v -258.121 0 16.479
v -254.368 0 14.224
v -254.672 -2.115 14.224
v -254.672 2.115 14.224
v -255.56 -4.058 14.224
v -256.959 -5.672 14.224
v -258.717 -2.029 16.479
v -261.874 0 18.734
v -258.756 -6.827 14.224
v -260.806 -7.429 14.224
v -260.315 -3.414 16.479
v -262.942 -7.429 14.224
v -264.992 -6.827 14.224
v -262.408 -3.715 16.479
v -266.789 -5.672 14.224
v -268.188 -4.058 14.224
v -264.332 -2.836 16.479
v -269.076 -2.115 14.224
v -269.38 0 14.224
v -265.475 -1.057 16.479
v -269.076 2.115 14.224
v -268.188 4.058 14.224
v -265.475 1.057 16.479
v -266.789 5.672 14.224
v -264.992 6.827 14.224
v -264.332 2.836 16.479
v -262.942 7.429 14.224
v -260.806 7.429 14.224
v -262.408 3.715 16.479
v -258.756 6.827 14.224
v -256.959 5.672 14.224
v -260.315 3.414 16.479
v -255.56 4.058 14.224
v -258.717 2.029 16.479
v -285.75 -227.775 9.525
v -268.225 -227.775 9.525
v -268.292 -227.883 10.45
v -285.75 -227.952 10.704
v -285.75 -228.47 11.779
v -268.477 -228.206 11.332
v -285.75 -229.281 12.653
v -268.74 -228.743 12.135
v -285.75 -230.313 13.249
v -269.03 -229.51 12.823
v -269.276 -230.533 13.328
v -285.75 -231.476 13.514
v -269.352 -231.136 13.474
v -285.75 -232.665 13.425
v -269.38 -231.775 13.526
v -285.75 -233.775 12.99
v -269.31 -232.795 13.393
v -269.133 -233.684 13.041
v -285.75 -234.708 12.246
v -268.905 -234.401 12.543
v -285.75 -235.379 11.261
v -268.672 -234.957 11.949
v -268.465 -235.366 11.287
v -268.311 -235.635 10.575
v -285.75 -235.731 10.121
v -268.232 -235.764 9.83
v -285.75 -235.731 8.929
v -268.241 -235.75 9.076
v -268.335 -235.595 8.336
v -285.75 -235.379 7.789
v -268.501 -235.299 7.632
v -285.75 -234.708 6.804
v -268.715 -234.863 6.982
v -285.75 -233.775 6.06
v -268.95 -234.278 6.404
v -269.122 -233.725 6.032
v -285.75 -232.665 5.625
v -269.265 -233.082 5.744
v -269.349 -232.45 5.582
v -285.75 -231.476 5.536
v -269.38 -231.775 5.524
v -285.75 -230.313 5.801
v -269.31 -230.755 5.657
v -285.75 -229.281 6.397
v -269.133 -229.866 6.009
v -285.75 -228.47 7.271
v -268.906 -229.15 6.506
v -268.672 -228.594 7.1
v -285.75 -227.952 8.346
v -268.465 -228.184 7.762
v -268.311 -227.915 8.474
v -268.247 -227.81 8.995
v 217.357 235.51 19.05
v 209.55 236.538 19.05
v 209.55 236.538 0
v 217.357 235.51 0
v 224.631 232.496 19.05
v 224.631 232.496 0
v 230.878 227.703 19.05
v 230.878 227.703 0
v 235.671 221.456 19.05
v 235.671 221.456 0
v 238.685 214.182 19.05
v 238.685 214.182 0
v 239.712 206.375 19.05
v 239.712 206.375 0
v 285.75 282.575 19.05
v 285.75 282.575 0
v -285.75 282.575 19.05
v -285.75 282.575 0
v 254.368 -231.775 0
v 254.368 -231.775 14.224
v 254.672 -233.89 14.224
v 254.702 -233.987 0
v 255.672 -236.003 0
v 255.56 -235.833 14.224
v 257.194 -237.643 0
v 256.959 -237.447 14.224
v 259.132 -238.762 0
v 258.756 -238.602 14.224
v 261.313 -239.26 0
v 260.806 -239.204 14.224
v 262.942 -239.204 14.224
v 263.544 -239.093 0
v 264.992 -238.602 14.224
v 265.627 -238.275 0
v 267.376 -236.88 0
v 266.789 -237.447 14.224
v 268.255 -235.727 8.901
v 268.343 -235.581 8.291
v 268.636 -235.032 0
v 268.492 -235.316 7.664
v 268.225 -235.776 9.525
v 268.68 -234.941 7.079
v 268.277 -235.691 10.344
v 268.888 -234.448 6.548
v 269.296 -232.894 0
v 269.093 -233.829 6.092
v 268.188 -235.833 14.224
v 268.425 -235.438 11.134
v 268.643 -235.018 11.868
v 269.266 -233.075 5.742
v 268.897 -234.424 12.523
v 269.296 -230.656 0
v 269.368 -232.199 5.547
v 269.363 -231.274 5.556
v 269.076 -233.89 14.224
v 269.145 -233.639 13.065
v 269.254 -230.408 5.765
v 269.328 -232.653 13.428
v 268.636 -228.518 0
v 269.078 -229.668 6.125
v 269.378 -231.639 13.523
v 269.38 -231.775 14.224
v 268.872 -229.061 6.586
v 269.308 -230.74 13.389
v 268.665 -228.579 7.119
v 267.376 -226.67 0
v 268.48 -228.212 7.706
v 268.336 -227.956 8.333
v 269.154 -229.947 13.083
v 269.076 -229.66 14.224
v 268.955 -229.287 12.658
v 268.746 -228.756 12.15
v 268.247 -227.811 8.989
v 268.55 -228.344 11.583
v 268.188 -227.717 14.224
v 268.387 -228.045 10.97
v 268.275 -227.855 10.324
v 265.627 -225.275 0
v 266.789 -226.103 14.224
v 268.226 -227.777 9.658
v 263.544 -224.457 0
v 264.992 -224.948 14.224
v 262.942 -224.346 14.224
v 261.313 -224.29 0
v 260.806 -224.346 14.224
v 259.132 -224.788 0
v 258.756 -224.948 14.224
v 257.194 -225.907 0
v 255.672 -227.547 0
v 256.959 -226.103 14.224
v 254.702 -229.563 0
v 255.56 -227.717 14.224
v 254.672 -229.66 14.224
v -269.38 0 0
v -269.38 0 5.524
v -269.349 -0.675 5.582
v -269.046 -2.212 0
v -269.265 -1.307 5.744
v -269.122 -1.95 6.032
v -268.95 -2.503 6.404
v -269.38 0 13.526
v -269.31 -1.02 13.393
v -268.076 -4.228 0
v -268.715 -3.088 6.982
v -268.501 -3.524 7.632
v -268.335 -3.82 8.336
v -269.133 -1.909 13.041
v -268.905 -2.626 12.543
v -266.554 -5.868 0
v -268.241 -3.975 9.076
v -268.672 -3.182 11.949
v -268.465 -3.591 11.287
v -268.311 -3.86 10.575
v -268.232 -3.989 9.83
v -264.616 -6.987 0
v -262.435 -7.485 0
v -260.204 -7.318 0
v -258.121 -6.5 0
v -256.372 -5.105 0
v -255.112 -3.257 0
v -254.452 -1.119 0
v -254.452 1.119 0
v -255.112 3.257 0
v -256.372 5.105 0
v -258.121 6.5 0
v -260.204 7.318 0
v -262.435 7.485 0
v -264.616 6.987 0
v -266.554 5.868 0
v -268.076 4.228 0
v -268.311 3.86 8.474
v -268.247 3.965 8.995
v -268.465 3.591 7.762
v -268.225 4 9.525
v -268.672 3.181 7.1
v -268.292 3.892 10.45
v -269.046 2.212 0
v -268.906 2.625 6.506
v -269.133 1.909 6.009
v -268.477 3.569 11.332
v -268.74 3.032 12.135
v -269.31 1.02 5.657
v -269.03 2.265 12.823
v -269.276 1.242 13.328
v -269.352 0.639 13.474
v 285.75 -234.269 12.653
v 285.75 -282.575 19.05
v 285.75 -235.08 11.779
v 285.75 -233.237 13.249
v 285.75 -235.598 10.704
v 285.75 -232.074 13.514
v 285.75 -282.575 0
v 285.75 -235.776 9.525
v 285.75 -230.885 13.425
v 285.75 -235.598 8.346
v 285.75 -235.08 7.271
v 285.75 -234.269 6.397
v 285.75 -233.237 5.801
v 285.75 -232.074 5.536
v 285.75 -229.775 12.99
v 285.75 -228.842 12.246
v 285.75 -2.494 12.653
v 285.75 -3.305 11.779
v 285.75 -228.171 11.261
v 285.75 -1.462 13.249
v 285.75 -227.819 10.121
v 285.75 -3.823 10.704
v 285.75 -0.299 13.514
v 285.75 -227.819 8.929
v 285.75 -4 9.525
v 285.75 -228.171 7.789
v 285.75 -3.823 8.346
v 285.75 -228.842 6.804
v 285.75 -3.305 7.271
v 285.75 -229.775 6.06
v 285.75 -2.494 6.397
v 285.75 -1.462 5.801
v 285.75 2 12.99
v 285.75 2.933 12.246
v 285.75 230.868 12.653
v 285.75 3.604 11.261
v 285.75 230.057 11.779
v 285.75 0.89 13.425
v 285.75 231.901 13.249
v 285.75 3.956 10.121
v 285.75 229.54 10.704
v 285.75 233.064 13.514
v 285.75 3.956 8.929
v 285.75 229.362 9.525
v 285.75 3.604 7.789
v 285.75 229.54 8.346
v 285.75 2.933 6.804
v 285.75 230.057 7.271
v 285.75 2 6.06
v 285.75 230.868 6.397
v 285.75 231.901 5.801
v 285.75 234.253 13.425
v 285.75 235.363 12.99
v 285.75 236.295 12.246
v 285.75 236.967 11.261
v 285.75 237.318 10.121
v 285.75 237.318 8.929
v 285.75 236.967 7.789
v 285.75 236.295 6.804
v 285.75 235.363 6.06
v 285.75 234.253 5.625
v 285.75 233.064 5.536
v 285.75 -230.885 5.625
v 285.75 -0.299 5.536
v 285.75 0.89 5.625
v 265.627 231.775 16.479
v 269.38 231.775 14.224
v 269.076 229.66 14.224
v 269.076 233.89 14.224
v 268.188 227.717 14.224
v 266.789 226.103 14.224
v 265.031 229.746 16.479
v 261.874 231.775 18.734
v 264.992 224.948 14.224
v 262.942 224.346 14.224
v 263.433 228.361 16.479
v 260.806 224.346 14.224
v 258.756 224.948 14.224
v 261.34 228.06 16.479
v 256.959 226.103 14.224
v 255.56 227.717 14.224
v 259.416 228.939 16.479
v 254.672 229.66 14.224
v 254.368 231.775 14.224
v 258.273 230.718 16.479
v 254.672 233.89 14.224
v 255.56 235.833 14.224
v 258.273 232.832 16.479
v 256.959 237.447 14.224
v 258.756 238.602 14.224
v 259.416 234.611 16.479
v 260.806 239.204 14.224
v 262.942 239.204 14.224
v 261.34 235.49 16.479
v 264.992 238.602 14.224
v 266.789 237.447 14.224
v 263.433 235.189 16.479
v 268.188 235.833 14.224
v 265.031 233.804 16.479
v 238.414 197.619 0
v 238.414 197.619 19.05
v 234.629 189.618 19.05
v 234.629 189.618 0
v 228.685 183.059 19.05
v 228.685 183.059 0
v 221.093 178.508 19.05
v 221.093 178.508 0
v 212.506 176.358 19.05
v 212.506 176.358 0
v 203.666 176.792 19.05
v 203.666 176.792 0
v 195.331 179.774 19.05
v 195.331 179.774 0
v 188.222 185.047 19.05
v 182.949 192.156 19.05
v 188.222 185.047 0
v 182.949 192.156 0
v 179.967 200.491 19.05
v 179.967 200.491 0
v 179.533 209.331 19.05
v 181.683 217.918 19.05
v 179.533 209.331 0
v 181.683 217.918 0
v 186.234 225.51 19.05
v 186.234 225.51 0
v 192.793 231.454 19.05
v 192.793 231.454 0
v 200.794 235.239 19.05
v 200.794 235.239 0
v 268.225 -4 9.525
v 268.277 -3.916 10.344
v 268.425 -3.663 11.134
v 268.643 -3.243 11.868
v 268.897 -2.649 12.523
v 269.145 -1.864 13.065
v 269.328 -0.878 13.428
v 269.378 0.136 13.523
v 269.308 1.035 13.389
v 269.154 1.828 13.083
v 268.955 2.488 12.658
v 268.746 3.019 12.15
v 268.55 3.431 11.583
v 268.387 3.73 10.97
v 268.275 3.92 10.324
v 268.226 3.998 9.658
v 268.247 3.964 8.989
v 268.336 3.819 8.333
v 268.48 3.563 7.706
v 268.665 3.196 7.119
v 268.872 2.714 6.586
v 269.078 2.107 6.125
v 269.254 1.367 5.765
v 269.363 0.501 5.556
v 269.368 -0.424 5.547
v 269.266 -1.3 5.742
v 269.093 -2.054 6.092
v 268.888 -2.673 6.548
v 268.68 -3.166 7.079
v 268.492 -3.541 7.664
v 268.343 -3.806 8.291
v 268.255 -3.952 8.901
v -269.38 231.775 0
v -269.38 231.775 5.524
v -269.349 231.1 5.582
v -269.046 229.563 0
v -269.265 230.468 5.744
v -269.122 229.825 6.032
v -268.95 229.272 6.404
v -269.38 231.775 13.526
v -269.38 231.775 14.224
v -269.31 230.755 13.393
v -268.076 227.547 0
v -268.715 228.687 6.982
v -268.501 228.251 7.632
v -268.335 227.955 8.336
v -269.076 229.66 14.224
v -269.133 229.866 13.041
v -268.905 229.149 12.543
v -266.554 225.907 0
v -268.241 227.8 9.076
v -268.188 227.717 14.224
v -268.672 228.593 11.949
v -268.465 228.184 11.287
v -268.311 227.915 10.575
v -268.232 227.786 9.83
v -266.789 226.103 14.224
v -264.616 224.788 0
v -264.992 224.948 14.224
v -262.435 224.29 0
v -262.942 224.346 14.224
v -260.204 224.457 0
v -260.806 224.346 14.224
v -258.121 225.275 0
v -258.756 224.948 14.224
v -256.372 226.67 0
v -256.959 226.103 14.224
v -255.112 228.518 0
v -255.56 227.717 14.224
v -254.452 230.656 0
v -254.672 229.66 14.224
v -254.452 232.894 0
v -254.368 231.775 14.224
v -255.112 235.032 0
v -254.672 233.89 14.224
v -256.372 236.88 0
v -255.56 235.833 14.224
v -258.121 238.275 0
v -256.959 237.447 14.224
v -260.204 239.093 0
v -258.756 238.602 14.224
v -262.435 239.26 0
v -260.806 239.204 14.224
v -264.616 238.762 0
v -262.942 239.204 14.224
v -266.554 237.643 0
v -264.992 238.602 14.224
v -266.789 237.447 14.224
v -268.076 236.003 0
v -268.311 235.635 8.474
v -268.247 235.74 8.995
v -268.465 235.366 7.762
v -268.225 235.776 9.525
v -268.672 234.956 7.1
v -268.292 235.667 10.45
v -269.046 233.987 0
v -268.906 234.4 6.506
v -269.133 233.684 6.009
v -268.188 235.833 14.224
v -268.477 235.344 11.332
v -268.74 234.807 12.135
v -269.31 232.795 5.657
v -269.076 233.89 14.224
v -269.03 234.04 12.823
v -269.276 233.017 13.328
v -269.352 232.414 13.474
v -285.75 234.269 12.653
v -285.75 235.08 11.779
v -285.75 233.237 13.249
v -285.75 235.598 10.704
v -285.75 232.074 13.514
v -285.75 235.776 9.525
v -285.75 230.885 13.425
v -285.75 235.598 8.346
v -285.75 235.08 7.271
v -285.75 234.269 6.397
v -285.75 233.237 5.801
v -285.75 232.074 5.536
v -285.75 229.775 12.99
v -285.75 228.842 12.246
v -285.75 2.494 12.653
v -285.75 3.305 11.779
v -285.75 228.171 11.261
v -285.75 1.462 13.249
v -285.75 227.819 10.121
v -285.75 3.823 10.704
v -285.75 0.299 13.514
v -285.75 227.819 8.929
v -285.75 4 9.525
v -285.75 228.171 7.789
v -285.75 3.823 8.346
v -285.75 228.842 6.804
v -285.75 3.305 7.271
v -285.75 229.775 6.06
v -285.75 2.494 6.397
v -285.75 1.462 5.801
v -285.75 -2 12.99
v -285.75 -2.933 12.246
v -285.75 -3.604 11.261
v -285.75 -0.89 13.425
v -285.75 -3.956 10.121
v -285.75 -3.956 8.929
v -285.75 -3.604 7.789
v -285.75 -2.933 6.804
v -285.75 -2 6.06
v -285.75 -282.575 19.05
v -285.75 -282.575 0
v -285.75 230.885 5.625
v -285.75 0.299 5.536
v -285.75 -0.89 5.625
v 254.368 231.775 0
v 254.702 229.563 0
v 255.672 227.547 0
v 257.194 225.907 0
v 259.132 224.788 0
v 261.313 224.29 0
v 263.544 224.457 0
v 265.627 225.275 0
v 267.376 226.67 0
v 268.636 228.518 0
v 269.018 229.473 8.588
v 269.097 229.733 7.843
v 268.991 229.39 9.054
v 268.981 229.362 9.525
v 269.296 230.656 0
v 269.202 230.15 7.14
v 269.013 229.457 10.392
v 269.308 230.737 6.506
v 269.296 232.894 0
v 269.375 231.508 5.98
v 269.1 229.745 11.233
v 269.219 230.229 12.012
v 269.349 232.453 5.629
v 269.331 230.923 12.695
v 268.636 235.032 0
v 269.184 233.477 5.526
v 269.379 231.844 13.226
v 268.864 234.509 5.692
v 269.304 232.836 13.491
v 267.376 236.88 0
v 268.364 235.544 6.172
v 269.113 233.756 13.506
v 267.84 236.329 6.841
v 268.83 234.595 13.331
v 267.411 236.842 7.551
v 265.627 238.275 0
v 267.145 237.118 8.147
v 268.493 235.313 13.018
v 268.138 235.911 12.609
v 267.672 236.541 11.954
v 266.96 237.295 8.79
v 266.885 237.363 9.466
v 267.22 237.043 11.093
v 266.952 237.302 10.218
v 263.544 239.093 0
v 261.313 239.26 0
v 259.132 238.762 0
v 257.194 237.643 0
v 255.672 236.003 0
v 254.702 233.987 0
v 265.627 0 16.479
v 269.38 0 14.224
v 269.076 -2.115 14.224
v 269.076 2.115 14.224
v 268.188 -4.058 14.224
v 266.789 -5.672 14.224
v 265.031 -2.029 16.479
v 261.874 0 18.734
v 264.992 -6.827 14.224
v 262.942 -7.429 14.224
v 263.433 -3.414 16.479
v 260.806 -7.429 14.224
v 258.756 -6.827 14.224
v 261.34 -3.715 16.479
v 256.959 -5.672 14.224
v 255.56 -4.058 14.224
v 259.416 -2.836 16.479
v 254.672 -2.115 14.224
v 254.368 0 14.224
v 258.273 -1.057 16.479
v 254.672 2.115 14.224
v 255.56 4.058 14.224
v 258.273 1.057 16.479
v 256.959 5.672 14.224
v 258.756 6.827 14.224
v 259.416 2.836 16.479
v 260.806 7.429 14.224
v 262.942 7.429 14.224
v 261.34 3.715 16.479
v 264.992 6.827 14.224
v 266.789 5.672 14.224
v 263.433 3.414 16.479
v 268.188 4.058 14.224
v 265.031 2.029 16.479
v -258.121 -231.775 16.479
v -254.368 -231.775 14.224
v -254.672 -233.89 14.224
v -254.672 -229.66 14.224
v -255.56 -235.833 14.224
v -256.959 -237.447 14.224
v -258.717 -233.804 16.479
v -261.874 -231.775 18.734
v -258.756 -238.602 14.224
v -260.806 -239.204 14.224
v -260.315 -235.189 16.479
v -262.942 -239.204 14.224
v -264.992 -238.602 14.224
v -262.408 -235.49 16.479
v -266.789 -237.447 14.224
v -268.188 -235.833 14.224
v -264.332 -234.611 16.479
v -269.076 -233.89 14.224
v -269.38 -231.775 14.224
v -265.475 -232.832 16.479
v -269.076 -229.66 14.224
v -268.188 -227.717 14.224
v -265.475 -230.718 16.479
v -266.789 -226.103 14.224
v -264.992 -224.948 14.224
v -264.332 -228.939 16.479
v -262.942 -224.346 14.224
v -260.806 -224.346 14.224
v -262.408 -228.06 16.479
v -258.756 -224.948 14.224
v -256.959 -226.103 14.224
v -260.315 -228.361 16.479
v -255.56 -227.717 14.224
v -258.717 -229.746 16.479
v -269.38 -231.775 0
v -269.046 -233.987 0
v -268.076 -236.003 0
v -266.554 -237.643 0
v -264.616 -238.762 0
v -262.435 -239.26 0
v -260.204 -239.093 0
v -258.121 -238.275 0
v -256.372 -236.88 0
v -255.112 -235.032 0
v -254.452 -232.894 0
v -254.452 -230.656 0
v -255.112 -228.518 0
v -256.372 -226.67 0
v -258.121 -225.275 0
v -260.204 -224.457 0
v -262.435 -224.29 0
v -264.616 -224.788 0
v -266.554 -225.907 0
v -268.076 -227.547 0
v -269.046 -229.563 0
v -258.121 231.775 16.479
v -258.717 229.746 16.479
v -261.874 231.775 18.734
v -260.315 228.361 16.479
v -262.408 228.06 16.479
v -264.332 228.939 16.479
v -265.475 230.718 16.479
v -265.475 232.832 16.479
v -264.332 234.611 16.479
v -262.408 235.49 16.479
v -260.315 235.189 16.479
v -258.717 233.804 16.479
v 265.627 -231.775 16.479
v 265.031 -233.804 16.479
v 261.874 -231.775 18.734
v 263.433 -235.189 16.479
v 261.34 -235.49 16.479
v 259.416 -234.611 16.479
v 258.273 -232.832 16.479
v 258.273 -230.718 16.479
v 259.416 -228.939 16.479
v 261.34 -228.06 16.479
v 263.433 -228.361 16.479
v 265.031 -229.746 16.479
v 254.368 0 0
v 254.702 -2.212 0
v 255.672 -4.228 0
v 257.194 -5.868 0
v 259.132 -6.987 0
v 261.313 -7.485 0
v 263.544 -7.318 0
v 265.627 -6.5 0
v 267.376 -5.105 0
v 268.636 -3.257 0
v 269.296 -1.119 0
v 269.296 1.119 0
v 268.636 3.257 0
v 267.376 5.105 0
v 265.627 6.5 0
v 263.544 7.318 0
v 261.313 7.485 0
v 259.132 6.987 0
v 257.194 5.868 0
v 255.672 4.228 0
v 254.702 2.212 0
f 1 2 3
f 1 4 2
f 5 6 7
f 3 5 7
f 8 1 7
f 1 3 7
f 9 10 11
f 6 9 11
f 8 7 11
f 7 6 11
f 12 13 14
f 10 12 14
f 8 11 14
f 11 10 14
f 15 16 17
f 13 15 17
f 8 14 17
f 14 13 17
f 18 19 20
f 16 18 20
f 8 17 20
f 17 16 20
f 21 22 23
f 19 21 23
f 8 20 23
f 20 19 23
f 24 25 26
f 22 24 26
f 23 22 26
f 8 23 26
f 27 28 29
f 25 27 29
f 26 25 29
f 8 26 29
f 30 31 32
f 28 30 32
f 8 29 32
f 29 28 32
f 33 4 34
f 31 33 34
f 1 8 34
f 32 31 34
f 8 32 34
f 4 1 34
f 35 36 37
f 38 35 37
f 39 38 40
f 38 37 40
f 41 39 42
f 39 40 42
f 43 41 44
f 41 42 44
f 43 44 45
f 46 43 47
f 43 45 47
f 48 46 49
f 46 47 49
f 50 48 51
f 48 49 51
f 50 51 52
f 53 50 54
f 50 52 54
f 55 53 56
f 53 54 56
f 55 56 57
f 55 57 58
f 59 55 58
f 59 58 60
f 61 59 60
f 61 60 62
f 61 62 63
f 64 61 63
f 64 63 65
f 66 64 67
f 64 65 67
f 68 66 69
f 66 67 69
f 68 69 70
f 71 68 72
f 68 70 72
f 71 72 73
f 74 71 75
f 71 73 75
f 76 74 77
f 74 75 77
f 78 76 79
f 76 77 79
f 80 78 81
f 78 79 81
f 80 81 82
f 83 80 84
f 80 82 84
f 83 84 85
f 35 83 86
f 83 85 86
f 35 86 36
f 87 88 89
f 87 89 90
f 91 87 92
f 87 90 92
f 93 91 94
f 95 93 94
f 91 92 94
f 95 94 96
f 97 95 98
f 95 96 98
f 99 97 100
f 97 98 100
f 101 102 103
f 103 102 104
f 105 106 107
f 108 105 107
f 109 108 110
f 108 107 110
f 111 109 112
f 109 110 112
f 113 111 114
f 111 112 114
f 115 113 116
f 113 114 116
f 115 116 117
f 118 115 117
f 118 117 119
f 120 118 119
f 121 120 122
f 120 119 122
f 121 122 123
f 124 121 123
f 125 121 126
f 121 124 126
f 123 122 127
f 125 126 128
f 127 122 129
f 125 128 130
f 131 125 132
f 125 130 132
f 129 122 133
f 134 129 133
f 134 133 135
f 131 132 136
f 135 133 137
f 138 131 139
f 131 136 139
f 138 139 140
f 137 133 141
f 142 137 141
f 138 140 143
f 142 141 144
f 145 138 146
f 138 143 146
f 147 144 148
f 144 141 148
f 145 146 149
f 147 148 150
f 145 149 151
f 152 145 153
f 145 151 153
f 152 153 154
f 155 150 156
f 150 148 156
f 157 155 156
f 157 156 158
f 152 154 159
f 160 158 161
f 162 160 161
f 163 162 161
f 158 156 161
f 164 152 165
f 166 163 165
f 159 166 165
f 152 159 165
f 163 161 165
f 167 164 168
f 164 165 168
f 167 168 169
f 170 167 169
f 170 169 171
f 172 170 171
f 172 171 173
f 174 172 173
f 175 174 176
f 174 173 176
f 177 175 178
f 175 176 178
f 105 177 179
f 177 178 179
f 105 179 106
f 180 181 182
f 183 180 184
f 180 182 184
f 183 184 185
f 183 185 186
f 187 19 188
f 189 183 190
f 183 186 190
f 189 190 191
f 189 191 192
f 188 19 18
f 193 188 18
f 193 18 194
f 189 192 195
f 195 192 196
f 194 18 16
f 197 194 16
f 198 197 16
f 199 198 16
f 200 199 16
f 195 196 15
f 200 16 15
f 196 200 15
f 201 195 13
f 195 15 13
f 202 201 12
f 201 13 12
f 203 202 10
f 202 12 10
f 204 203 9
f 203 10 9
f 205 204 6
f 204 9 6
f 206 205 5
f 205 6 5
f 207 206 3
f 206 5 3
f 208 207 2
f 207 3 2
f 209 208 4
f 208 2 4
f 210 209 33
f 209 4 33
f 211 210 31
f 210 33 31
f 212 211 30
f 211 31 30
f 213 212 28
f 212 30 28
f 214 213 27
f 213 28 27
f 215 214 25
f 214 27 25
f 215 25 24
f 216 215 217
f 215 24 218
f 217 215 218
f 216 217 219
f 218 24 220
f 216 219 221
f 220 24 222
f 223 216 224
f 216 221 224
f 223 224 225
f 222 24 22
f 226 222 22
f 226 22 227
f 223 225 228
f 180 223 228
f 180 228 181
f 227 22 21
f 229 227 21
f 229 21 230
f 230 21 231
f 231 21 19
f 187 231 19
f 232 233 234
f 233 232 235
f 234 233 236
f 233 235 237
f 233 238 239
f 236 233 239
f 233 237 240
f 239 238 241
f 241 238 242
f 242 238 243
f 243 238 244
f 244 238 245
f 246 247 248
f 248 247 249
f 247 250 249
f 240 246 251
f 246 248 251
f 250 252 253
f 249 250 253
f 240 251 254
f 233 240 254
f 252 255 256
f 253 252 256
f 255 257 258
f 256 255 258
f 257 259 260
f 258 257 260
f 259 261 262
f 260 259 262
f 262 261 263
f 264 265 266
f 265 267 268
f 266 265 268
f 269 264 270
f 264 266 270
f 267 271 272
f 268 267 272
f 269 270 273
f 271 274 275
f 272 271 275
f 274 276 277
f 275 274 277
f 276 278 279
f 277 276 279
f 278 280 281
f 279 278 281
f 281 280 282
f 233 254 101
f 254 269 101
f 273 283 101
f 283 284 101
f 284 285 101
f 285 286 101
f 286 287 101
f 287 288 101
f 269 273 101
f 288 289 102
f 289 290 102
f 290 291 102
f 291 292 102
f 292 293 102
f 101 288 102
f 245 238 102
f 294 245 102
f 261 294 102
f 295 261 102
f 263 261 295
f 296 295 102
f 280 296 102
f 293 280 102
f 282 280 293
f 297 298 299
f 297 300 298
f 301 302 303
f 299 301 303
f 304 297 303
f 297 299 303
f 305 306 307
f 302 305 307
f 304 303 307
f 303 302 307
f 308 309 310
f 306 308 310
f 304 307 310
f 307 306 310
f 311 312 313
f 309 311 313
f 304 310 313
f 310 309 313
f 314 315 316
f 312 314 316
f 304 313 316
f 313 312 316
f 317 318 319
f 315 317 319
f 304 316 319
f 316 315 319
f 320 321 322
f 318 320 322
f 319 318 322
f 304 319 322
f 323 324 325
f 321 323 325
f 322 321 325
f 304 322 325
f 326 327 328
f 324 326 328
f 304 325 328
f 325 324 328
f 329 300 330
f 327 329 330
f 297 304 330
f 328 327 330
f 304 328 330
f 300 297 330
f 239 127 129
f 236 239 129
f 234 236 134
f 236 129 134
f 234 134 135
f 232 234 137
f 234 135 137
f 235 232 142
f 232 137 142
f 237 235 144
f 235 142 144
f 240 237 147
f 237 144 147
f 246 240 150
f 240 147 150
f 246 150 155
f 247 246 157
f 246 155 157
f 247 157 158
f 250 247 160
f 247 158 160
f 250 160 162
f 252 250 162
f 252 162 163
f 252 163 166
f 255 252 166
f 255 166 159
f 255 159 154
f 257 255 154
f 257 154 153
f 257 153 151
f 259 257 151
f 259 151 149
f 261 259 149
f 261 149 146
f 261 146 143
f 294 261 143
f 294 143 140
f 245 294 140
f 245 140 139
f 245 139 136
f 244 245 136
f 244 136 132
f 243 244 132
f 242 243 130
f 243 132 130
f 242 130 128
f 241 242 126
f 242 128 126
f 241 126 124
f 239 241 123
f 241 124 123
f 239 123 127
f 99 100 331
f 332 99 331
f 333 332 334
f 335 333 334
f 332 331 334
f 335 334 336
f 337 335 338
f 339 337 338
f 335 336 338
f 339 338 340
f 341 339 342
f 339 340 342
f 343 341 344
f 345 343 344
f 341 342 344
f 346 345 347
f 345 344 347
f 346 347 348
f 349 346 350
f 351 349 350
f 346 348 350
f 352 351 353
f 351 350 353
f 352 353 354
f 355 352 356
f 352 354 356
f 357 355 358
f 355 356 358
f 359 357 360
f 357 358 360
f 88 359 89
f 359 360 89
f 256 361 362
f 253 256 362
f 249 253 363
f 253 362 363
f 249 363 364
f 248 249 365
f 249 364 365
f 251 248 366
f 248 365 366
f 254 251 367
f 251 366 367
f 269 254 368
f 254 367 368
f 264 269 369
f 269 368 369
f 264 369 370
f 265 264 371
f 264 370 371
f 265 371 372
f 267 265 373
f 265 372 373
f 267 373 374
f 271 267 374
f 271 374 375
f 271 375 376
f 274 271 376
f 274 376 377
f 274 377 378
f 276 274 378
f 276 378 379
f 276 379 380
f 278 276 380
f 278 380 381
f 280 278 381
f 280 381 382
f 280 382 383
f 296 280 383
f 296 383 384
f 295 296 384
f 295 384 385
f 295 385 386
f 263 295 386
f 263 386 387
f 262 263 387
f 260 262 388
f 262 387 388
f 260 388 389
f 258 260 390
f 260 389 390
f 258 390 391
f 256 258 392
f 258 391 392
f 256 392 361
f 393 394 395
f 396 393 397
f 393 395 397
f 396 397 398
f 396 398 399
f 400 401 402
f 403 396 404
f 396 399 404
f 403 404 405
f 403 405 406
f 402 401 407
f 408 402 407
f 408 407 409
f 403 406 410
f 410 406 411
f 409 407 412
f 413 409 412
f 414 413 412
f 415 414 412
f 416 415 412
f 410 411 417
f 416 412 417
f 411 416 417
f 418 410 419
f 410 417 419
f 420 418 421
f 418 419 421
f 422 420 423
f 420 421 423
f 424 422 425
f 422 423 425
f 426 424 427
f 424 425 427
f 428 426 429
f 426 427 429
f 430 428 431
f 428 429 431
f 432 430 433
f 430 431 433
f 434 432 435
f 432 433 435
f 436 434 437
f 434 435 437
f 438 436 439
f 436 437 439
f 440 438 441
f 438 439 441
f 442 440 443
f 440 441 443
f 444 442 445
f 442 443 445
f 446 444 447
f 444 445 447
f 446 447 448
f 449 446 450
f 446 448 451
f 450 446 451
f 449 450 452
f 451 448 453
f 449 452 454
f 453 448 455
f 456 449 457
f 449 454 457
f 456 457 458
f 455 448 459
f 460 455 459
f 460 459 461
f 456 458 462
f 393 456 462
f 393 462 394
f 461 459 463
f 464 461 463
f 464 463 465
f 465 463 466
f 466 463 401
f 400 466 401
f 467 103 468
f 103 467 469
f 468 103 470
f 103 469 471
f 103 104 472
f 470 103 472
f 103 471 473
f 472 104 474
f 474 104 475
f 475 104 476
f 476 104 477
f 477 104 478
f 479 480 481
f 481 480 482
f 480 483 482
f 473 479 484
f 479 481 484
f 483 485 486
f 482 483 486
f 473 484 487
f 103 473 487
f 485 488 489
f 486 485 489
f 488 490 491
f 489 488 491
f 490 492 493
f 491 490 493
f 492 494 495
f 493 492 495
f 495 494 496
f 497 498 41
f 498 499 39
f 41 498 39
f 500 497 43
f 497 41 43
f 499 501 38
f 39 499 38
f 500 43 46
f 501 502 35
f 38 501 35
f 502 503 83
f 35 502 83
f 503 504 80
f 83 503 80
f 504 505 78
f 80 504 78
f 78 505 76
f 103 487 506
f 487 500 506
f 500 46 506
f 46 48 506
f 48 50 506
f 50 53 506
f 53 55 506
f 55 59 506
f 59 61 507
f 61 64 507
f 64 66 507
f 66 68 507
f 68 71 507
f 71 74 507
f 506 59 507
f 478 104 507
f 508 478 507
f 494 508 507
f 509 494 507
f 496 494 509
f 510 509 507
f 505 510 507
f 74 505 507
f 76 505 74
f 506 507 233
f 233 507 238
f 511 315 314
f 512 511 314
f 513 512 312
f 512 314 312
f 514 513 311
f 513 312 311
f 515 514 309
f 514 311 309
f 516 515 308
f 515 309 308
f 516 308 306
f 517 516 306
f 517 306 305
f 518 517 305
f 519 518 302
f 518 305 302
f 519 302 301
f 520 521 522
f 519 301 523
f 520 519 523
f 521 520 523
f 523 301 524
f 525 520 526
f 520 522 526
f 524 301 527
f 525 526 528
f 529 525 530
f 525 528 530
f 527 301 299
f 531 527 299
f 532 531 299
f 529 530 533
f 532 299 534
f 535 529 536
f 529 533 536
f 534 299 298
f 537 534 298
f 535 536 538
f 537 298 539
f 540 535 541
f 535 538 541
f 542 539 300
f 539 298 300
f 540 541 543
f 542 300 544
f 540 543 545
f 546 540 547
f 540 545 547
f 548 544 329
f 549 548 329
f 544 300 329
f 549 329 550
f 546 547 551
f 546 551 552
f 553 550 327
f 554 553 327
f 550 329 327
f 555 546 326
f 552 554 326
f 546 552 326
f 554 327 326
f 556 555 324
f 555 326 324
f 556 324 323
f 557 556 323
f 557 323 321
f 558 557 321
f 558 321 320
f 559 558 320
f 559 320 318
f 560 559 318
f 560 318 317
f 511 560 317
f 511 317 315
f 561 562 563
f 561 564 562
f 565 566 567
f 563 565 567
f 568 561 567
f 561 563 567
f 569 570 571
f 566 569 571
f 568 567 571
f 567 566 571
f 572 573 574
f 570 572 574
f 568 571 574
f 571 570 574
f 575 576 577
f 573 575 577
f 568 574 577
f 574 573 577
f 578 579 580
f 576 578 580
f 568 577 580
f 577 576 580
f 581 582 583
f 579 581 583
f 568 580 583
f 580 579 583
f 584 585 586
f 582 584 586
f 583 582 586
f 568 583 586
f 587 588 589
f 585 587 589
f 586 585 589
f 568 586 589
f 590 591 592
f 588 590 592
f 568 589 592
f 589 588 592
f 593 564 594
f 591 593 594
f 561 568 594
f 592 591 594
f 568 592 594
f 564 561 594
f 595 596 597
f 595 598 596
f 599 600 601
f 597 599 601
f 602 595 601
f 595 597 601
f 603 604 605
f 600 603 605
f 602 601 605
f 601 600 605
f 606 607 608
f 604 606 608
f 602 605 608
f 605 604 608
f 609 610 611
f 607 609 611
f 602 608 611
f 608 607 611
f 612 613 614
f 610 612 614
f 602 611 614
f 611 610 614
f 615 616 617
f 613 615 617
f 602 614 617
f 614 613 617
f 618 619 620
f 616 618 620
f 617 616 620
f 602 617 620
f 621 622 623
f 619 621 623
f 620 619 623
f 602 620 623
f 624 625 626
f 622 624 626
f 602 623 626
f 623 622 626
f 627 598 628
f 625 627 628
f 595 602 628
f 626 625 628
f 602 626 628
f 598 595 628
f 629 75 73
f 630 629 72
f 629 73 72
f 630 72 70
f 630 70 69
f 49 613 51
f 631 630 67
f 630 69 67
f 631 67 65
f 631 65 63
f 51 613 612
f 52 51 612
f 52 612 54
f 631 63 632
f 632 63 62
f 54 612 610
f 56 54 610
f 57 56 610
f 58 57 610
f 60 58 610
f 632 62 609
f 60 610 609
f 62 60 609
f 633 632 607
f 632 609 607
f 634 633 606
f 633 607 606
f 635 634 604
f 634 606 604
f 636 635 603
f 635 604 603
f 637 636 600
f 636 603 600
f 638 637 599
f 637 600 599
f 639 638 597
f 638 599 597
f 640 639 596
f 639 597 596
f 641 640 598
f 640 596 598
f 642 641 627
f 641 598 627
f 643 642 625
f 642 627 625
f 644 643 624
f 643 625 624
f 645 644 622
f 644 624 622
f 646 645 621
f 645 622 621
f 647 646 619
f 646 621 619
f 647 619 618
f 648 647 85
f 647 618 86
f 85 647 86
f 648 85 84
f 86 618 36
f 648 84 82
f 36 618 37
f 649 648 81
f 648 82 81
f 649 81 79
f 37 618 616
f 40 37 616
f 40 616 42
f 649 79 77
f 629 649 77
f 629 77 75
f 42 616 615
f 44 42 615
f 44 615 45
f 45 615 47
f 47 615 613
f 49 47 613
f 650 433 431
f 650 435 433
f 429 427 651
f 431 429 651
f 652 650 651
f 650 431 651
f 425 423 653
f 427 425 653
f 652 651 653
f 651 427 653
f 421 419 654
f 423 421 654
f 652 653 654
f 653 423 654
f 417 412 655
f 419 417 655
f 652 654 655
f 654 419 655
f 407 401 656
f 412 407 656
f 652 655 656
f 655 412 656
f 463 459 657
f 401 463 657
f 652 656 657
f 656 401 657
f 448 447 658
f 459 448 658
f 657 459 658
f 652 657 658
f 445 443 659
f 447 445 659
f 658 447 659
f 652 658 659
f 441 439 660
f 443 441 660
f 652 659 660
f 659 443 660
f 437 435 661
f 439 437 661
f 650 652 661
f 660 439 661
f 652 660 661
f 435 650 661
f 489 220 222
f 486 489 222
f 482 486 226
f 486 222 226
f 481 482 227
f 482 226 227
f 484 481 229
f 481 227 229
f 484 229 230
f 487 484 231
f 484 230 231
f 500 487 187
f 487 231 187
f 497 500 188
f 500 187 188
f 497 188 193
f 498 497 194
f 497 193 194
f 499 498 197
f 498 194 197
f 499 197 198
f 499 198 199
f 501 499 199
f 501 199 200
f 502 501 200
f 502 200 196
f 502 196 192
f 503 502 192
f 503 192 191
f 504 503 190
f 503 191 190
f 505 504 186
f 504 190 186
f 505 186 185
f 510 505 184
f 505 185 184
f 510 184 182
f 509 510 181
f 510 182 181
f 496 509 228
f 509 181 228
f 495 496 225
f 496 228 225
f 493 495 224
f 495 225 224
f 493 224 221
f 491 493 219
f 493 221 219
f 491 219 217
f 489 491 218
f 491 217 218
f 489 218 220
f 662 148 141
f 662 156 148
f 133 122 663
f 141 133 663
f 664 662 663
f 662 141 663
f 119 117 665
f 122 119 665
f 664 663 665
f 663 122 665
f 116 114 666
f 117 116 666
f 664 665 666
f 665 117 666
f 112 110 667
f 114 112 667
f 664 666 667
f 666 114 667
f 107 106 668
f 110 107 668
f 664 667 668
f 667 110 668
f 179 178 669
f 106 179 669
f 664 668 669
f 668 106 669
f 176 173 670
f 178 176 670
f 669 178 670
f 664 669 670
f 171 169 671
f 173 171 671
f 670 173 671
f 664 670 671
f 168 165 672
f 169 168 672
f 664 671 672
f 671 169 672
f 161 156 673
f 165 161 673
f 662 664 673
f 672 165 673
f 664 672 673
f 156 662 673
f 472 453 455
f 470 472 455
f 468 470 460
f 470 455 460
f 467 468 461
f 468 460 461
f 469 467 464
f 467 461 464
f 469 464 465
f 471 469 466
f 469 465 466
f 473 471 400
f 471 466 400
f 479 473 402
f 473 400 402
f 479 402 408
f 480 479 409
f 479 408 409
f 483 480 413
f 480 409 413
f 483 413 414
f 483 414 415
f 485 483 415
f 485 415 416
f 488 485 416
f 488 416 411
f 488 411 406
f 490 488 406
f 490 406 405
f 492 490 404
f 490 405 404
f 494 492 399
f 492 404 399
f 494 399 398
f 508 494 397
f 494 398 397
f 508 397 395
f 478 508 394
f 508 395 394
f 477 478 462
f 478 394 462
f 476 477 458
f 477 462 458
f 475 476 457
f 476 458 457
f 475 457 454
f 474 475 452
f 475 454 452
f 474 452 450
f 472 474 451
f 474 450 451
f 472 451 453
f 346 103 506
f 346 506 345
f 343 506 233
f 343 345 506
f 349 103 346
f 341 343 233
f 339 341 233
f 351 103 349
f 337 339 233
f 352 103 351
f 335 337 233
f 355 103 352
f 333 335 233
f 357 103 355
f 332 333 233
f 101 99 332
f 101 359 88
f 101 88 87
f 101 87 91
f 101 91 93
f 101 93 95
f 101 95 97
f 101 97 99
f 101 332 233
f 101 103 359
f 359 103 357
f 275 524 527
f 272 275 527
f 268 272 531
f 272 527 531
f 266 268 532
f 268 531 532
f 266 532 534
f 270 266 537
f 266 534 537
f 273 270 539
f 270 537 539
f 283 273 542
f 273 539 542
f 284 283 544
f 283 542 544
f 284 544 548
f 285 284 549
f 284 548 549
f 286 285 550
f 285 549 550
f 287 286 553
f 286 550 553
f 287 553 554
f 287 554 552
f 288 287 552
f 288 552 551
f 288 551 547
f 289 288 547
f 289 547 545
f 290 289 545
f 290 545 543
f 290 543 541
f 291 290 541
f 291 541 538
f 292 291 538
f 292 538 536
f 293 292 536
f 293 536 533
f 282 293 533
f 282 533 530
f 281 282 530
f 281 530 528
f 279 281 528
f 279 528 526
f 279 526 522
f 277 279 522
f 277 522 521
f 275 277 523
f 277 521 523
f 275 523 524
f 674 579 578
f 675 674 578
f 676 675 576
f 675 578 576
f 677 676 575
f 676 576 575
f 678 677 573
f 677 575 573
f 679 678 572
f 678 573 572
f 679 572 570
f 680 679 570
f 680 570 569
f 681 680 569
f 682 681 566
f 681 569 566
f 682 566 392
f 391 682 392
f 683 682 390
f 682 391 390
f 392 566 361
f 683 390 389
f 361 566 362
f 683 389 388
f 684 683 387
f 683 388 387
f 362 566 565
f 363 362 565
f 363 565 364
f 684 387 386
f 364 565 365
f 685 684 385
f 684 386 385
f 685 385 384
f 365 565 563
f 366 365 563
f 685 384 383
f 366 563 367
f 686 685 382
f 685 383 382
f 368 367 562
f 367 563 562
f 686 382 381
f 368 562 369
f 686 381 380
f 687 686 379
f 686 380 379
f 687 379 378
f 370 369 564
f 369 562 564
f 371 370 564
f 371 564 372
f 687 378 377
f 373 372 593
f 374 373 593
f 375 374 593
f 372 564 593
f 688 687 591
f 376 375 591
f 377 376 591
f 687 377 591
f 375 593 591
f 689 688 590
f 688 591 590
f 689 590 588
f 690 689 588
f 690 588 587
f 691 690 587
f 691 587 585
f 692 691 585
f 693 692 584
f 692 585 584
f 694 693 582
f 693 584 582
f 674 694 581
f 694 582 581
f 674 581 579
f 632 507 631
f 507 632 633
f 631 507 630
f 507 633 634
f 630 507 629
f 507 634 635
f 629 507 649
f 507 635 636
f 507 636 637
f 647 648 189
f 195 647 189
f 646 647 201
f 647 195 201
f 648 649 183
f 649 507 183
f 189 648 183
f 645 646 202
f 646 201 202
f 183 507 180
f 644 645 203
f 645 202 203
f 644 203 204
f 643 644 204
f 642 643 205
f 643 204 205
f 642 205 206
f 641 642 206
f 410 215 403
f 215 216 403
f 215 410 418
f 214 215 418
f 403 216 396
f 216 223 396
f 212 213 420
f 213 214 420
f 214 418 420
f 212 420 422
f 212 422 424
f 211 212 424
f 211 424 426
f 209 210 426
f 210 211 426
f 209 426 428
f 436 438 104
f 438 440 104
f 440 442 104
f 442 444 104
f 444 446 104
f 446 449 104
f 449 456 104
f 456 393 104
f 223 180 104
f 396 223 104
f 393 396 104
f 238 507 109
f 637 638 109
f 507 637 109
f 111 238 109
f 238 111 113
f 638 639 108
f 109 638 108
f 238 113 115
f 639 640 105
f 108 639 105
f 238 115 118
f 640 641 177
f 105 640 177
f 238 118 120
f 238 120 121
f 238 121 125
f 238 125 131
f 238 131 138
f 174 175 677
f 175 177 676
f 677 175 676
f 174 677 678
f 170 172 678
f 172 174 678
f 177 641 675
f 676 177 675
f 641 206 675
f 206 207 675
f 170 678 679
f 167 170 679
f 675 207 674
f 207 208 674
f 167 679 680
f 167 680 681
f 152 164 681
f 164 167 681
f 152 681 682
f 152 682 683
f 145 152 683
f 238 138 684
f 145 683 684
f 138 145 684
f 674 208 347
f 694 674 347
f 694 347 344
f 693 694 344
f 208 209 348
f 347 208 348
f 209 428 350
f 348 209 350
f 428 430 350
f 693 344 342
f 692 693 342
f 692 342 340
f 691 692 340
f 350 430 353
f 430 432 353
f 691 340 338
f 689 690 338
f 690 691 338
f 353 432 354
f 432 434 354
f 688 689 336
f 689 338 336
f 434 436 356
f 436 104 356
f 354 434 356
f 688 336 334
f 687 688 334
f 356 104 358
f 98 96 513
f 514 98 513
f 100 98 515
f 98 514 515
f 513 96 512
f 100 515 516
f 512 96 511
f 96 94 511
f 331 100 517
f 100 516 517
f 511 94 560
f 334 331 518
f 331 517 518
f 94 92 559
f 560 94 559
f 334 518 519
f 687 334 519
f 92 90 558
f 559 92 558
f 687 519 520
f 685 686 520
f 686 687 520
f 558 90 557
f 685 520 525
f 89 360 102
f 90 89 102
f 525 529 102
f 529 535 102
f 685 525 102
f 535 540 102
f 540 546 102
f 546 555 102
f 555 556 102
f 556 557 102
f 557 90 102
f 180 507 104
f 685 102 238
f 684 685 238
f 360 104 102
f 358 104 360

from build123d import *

# Parameters (mm, degrees)
F1_DEPTH = 19.05
F3_D     = 15.0114
F3_DEPTH = 14.224
F3_TIP   = 4.5098795482
F5_D     = 8.001
F5_DEPTH = 25.4
F5_TIP   = 2.4037429064
F7_D     = 8.001
F7_DEPTH = 25.4
F7_TIP   = 2.4037429064


# Not quite as in the source:
# - a feature names something its author has since deleted; it is built from what else it names


with BuildPart() as f1:
    # F0 (on Top) → F1 (new body)
    with BuildSketch(Plane.XY):
        with BuildLine():
            Line((209.55, 236.5375), (209.55, 282.575))
            Line((209.55, 282.575), (-285.75, 282.575))
            Line((-285.75, 282.575), (-285.75, -282.575))
            Line((-285.75, -282.575), (285.75, -282.575))
            Line((285.75, -282.575), (285.75, 206.375))
            Line((285.75, 206.375), (239.7125, 206.375))
            ThreePointArc((239.7125, 206.375), (188.2218917125, 185.0468917125), (209.55, 236.5375))
        make_face()
        with BuildLine():
            Line((285.75, 206.375), (285.75, 282.575))
            Line((285.75, 282.575), (209.55, 282.575))
            Line((209.55, 282.575), (209.55, 236.5375))
            ThreePointArc((209.55, 236.5375), (230.8781082875, 227.7031082875), (239.7125, 206.375))
            Line((239.7125, 206.375), (285.75, 206.375))
        make_face()
    extrude(amount=F1_DEPTH)

    # F3
    with Locations(Plane(origin=(0, 0, 0), x_dir=(1, 0, 0), z_dir=(0, 0, -1))):
        with Locations((-261.874, 231.775), (261.874, 231.775), (-261.874, 0), (261.874, 0), (261.874, -231.775), (-261.874, -231.775)):
            Hole(F3_D / 2, depth=F3_DEPTH)
            with Locations((0, 0, -(F3_DEPTH + F3_TIP / 2))):  # 118° drill point
                Cone(0, F3_D / 2, F3_TIP, mode=Mode.SUBTRACT)

    # F5
    with Locations(Plane.YZ.offset(285.75)):
        with Locations((-231.775, 9.525), (0, 9.525), (233.3625, 9.525)):
            Hole(F5_D / 2, depth=F5_DEPTH)
            with Locations((0, 0, -(F5_DEPTH + F5_TIP / 2))):  # 118° drill point
                Cone(0, F5_D / 2, F5_TIP, mode=Mode.SUBTRACT)

    # F7
    with Locations(Plane(origin=(-285.75, 0, 0), x_dir=(0, -1, 0), z_dir=(-1, 0, 0))):
        with Locations((0, 9.525), (231.775, 9.525), (-231.775, 9.525)):
            Hole(F7_D / 2, depth=F7_DEPTH)
            with Locations((0, 0, -(F7_DEPTH + F7_TIP / 2))):  # 118° drill point
                Cone(0, F7_D / 2, F7_TIP, mode=Mode.SUBTRACT)


solid = f1.part
